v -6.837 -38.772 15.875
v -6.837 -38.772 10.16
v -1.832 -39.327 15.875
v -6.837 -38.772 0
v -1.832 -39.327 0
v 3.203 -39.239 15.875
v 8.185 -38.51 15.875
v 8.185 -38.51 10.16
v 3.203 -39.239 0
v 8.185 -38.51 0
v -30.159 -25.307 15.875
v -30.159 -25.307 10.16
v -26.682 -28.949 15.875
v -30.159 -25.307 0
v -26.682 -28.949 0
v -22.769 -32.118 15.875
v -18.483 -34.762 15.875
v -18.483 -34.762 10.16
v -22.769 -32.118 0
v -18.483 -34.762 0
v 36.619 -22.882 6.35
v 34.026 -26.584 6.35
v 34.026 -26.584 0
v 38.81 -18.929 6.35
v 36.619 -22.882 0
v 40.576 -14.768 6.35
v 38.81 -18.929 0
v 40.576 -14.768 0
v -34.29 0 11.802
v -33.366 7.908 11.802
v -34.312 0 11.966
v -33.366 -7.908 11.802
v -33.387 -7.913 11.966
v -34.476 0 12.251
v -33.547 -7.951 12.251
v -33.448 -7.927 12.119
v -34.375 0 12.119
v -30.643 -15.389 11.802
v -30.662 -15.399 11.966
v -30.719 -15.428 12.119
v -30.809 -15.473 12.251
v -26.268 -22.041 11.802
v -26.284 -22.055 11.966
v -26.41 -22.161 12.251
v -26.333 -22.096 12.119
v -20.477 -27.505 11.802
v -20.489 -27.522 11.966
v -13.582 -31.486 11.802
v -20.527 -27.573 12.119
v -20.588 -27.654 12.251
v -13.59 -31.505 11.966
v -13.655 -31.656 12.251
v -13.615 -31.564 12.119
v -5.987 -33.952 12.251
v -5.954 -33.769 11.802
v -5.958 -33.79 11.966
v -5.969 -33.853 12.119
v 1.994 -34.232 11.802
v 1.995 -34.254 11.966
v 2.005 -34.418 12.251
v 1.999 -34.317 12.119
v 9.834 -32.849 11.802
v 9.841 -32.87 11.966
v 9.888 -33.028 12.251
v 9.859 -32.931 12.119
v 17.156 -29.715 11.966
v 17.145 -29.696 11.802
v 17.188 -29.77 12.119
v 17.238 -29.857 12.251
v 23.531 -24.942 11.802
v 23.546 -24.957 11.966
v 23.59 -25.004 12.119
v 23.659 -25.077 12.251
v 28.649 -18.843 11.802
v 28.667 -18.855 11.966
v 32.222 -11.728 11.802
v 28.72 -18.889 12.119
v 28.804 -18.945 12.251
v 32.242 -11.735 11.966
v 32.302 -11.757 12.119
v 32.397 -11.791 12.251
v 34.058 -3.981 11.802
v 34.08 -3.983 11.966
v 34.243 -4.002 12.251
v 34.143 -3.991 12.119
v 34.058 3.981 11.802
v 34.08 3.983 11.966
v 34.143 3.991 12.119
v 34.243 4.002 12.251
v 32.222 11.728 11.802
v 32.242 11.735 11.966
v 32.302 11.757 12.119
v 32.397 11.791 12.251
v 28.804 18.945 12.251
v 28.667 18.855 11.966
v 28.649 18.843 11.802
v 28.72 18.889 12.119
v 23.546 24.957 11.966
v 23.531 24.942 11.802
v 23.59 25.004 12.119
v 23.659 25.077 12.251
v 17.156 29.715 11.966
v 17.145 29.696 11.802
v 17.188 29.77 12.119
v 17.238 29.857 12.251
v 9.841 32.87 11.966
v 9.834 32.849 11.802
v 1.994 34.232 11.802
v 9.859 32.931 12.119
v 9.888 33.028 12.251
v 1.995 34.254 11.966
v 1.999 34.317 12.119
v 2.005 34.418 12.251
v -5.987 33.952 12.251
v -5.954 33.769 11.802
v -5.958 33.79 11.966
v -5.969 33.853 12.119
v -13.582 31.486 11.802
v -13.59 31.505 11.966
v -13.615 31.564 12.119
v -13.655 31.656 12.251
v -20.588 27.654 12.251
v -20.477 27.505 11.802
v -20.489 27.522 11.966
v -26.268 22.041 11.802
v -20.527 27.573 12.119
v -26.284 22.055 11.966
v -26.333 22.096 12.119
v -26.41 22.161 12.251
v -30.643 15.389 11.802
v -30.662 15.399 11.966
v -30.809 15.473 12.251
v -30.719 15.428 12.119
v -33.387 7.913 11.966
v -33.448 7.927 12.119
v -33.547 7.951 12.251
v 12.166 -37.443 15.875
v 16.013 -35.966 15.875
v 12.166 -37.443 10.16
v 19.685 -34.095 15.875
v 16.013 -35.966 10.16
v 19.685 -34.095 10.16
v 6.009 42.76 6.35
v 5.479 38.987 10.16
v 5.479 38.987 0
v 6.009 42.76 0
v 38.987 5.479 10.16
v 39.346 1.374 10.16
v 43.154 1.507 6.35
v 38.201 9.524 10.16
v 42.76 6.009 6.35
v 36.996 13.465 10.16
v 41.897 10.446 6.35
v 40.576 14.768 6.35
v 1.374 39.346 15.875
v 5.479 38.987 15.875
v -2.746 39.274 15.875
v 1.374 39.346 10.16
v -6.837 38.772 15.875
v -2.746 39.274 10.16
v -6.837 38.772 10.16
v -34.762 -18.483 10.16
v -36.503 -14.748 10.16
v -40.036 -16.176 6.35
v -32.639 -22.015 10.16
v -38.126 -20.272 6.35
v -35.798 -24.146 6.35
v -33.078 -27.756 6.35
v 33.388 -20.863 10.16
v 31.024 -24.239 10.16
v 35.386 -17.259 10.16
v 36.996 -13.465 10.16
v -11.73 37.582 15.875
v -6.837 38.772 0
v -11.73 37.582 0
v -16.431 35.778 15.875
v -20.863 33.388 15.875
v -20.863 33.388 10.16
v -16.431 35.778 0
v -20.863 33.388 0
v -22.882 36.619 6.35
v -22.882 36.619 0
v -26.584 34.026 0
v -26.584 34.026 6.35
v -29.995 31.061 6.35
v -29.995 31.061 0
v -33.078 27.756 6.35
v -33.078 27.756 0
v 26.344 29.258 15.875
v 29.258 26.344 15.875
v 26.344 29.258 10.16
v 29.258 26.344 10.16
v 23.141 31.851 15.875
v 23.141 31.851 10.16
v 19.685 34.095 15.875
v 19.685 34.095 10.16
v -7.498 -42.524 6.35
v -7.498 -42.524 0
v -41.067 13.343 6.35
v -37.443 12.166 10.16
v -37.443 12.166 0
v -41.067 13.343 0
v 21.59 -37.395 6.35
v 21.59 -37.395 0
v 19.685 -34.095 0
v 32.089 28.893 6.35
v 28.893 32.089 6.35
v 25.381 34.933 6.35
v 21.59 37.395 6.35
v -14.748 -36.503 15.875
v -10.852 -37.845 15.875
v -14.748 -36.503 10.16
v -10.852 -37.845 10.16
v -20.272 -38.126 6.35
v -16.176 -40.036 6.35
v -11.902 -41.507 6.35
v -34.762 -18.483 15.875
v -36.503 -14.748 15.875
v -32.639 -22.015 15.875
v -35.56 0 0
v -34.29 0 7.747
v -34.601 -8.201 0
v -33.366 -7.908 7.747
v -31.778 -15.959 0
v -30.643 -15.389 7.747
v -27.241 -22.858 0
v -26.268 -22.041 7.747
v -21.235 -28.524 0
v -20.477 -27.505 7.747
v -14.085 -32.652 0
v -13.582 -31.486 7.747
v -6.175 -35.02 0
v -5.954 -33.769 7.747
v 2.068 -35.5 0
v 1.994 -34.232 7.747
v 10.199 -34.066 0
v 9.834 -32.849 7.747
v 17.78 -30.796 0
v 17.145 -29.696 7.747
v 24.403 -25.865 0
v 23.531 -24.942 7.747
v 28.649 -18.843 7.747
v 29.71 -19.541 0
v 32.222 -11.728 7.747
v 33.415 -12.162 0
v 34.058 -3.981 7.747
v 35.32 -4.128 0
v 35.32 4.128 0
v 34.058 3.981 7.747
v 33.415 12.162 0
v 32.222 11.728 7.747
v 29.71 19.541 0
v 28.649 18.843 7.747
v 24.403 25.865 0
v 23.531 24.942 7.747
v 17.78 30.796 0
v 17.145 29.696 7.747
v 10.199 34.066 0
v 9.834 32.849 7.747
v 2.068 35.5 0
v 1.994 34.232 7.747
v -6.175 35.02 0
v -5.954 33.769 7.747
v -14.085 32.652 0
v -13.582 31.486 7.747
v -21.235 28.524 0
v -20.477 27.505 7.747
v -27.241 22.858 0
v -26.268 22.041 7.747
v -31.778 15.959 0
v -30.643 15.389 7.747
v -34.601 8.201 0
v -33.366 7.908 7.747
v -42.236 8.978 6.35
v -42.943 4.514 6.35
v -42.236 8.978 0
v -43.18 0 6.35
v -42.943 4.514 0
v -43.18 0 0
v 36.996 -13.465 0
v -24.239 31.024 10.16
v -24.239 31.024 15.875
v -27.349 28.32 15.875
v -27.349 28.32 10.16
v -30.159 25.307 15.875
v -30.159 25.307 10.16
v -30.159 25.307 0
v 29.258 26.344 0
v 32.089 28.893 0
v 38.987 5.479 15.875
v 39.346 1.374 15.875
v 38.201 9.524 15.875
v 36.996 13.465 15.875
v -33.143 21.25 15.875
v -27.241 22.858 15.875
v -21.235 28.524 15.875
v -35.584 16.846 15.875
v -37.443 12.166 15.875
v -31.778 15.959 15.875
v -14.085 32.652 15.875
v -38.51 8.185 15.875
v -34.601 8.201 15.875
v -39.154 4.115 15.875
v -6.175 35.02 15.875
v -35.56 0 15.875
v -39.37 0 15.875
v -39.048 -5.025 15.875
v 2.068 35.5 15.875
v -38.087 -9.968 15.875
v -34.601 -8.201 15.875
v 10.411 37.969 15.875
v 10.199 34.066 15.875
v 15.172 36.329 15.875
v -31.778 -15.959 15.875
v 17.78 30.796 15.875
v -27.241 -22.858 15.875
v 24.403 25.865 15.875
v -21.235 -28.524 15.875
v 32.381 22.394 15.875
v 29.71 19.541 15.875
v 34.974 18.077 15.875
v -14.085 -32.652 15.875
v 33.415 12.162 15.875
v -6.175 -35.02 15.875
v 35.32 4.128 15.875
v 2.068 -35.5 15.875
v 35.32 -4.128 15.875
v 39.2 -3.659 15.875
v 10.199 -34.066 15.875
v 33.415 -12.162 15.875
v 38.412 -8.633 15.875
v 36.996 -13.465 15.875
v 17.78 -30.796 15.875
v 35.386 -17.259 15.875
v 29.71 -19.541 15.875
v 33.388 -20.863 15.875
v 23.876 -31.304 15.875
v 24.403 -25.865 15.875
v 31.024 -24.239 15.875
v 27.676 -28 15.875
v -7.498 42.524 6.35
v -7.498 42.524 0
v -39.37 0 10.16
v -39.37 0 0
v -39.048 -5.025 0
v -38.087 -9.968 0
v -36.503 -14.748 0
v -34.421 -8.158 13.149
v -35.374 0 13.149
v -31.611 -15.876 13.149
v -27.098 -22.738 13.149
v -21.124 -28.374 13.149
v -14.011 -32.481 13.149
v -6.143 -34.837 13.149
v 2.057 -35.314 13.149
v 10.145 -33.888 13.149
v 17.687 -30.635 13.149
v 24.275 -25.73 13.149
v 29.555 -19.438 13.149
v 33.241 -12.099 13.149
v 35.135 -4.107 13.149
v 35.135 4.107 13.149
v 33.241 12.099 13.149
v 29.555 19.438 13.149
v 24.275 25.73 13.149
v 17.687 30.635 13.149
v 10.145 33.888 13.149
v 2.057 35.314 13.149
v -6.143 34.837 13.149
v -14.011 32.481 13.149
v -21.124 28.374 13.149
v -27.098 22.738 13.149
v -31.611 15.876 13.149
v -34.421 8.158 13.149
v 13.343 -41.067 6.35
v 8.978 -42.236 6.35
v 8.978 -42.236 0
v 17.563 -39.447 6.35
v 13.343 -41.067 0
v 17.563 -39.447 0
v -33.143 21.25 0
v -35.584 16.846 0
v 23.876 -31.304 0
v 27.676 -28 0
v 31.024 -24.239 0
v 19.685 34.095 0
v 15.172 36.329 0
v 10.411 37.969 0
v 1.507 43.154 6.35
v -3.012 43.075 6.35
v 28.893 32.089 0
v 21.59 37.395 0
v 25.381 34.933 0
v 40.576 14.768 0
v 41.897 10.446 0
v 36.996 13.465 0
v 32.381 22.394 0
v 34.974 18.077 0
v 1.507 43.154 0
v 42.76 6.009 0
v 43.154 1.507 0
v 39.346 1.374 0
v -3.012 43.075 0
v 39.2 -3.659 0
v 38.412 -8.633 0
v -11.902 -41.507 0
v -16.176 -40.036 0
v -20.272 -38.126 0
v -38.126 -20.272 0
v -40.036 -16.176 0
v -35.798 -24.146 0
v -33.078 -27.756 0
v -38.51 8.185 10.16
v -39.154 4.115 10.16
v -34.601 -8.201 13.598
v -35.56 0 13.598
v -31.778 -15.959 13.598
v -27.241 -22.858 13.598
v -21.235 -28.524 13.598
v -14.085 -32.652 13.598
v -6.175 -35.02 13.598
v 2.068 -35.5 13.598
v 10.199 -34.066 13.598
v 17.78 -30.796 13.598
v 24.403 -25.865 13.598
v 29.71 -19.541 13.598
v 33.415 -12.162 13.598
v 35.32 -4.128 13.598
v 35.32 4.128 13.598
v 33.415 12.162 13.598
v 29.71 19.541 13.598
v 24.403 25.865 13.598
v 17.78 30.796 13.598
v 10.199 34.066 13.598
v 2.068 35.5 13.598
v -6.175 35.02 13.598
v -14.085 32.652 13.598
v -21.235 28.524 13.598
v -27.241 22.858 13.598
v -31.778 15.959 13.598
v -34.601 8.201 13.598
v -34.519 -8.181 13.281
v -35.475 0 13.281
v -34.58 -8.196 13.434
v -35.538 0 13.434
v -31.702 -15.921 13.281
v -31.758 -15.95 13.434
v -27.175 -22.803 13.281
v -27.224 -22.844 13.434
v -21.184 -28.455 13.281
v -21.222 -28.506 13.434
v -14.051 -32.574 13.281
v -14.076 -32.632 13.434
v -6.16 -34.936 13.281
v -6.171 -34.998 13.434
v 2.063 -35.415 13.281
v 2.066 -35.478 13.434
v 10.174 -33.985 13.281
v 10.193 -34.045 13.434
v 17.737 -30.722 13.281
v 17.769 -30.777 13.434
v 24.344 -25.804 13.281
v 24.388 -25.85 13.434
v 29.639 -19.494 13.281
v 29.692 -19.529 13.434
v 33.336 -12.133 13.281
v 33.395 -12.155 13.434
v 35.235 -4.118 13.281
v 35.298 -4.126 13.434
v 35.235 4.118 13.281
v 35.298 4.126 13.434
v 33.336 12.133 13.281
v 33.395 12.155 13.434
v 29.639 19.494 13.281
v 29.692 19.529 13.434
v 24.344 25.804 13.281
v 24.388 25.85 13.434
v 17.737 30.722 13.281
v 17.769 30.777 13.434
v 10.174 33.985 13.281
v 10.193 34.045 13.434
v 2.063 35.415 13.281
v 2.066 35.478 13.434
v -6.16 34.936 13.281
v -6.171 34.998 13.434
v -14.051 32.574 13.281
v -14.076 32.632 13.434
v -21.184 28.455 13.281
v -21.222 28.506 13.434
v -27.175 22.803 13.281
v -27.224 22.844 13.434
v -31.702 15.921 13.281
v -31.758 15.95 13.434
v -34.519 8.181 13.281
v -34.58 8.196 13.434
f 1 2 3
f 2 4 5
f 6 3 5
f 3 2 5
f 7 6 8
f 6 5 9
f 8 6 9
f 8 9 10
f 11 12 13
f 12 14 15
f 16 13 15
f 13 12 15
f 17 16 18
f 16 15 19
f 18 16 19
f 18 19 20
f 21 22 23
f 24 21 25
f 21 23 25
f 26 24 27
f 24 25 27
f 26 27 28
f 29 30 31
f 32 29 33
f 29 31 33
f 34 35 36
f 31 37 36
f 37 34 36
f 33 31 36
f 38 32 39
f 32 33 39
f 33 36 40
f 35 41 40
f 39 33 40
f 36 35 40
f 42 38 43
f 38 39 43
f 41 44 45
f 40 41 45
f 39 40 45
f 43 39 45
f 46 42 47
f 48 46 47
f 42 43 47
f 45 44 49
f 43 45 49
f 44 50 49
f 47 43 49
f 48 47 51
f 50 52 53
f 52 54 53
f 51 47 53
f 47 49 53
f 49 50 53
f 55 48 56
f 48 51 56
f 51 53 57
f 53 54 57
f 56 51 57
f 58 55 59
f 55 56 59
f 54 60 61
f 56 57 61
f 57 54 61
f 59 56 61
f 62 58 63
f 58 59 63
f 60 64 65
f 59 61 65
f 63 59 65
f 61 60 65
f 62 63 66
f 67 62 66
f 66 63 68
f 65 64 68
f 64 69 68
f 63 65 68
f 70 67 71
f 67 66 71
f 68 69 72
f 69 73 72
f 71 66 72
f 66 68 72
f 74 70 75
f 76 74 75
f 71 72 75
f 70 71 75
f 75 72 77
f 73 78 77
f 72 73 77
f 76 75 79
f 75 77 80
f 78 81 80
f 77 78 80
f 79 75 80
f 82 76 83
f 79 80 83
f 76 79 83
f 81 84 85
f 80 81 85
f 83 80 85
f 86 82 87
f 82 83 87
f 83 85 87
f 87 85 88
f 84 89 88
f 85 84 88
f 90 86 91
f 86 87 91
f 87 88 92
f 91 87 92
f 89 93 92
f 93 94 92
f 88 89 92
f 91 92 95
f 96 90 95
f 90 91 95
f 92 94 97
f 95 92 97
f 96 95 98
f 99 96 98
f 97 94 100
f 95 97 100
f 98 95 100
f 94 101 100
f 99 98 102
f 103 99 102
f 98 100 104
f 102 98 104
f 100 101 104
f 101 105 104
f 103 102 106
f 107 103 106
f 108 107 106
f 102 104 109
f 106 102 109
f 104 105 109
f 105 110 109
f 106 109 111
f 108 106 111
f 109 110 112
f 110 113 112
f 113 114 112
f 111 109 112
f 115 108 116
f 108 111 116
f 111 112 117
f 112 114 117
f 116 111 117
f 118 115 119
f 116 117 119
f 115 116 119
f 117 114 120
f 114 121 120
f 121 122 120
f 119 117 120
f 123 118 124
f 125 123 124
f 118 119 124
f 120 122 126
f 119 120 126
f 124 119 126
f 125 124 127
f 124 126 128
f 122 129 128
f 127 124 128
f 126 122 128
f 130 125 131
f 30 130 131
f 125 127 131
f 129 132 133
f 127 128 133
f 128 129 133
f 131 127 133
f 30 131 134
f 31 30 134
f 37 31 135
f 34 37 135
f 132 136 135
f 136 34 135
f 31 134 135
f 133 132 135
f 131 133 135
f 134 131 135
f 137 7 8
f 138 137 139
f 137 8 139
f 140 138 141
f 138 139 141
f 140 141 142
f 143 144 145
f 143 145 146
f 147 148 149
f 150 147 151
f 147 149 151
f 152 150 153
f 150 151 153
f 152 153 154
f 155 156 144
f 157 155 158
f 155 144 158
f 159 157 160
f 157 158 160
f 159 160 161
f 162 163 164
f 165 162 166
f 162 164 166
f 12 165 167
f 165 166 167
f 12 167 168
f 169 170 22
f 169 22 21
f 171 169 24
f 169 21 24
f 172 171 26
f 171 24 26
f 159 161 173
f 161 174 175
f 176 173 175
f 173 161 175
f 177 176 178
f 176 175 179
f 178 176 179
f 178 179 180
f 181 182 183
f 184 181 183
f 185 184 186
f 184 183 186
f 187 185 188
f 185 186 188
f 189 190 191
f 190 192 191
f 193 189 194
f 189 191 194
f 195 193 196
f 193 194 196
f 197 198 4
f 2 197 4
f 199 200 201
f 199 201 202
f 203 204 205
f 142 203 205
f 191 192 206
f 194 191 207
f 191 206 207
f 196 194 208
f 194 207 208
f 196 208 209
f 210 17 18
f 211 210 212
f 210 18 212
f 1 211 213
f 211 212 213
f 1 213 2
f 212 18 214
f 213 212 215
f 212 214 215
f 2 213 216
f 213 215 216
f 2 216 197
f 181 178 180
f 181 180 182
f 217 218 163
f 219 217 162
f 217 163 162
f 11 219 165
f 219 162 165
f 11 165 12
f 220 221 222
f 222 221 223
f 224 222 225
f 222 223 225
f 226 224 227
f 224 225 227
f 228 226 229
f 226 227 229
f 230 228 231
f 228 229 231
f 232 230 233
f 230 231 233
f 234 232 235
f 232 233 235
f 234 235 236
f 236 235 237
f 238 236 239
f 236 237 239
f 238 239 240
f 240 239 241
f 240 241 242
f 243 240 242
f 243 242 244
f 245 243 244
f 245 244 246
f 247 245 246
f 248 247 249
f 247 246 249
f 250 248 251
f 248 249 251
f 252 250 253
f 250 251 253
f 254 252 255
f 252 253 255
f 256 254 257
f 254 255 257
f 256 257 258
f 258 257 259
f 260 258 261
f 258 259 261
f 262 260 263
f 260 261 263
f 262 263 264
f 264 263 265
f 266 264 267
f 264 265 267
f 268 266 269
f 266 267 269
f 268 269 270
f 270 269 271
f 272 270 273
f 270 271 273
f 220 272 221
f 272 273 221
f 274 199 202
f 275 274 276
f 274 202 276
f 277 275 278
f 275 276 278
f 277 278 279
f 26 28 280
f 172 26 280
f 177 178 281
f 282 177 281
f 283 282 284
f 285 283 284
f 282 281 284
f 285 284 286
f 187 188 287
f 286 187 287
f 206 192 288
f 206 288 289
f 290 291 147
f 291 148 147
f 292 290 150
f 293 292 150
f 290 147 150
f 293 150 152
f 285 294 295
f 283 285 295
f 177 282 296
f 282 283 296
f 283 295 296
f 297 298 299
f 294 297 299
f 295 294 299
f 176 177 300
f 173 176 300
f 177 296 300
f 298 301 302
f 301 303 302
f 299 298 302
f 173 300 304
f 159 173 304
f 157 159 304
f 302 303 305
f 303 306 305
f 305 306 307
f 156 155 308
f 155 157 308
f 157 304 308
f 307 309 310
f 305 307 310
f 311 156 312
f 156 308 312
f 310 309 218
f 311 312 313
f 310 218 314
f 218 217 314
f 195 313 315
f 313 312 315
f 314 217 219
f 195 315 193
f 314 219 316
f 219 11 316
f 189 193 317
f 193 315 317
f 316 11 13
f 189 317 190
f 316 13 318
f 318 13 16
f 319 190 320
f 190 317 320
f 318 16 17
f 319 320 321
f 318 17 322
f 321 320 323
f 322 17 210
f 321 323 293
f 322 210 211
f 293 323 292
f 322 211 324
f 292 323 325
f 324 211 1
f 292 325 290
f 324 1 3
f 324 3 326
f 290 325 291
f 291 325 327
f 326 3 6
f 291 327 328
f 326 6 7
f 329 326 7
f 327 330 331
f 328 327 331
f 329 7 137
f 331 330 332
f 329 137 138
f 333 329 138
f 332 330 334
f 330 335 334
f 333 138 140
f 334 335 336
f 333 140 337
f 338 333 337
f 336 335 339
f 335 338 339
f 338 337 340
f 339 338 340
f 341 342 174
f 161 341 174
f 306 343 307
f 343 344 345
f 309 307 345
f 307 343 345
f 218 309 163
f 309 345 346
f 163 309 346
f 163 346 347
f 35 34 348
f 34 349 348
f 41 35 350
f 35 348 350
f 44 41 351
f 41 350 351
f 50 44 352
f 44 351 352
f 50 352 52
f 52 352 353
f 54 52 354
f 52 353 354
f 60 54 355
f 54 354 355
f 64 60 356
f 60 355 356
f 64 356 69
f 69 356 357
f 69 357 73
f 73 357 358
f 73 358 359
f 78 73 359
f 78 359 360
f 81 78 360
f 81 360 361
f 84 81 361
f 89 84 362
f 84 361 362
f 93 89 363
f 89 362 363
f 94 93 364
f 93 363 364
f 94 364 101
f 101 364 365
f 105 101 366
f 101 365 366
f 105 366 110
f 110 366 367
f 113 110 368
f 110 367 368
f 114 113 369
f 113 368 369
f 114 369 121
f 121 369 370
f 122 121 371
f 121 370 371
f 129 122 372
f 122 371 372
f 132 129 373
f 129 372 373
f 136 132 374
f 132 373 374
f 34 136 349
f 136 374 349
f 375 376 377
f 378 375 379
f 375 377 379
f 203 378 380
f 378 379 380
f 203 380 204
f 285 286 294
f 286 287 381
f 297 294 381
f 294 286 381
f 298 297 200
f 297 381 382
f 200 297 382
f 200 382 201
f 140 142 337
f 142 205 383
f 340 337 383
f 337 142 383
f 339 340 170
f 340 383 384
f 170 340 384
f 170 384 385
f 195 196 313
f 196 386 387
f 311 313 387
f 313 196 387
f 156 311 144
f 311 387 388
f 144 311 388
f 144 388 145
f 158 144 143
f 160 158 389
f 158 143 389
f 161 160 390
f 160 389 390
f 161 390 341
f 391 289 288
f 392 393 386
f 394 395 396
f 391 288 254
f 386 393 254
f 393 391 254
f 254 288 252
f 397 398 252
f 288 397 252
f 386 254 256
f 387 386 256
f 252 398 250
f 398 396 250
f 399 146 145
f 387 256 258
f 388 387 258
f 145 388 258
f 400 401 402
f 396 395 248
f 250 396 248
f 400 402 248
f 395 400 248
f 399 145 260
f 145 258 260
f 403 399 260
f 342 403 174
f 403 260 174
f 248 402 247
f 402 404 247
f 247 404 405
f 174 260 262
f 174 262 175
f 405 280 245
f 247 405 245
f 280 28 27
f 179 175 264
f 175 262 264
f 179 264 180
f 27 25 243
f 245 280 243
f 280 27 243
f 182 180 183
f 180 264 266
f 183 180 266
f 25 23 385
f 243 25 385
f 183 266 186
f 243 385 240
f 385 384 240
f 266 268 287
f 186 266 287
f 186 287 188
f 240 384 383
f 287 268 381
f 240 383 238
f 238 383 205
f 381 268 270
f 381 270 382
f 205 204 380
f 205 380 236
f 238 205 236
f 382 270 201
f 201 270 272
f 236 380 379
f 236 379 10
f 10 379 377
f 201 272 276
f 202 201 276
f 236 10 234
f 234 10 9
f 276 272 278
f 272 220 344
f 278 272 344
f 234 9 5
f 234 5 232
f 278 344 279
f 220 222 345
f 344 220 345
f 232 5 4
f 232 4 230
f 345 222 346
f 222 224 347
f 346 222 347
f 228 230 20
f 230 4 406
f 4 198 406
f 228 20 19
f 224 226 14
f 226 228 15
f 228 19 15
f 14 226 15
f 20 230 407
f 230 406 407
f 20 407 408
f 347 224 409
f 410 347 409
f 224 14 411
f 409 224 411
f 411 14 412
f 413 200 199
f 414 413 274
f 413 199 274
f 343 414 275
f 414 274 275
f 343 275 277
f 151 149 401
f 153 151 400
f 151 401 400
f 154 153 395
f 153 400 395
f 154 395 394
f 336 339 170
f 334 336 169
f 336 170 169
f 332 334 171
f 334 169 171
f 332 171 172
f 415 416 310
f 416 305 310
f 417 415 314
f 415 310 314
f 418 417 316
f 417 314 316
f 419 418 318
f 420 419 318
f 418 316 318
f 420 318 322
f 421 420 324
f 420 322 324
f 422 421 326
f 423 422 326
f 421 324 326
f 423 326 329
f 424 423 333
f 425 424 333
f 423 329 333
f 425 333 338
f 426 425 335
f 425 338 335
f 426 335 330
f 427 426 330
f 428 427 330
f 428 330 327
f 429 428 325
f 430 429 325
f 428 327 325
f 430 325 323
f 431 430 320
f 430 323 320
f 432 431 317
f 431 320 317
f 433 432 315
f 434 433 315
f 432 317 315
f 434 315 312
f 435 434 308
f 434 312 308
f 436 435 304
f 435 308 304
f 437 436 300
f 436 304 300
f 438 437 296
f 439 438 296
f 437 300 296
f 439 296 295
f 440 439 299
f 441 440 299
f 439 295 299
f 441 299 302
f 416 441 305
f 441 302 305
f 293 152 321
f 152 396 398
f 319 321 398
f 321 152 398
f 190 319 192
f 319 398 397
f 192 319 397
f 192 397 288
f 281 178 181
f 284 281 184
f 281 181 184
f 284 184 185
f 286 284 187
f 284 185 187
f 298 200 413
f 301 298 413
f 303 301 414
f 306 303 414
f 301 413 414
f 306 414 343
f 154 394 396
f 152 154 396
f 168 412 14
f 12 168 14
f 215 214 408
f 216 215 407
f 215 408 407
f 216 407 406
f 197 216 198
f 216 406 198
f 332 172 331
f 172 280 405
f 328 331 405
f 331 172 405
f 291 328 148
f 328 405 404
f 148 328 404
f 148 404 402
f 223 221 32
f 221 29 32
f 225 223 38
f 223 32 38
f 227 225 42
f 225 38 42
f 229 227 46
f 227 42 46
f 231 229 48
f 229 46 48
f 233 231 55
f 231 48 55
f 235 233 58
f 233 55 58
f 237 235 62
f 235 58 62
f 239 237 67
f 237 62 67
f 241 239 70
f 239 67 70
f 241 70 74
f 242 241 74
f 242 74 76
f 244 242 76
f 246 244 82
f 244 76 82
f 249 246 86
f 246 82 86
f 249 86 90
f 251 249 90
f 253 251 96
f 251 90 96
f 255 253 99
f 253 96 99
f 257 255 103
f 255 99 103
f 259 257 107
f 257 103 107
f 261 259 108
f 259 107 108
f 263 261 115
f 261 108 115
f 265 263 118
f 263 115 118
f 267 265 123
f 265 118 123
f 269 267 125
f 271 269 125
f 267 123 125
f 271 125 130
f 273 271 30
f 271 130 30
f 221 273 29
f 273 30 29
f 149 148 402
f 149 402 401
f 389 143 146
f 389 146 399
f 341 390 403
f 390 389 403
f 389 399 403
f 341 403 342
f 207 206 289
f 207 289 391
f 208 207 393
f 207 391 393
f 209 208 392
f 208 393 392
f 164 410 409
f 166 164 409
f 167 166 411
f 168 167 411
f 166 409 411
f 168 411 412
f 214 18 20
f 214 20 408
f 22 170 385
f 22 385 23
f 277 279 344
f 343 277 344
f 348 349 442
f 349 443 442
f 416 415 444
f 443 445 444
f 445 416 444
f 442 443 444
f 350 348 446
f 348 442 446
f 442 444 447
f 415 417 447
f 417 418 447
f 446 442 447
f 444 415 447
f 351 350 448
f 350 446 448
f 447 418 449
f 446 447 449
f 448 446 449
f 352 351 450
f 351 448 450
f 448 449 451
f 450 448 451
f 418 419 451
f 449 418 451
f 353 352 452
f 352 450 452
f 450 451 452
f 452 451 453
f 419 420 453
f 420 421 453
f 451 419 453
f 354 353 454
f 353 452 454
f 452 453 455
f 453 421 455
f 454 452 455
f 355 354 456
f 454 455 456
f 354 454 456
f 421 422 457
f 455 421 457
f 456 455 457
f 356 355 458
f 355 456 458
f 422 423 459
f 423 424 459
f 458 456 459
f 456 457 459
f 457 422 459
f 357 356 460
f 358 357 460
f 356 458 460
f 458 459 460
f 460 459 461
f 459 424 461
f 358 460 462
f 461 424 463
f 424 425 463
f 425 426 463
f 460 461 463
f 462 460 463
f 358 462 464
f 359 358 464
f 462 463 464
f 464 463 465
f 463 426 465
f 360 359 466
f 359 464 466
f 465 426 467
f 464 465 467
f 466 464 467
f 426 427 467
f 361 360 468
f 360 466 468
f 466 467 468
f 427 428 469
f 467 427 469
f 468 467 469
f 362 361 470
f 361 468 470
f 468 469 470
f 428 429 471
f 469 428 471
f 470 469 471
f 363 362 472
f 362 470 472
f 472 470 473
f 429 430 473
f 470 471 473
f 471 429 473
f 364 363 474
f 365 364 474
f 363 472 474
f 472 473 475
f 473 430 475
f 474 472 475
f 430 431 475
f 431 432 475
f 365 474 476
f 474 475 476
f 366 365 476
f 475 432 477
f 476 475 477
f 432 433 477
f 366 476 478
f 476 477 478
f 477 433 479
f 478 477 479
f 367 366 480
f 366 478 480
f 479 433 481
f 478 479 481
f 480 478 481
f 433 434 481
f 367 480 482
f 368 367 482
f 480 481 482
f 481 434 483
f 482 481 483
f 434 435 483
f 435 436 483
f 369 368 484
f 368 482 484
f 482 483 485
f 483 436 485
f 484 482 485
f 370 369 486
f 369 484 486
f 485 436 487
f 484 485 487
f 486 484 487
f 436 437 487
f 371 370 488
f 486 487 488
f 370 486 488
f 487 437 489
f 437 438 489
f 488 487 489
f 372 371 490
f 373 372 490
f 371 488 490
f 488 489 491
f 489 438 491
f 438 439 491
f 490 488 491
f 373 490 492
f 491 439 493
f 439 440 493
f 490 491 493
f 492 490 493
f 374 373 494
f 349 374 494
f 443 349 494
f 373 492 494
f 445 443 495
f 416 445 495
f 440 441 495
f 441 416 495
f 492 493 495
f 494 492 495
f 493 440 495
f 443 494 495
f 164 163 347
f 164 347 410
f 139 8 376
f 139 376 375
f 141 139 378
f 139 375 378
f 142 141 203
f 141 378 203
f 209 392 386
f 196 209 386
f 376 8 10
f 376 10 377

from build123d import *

# Parameters (mm, degrees)
F3_DEPTH        = 25.4
F3_COPIES_COUNT = 9


# Not quite as in the source:
# - a pattern or mirror of a feature is missing from the dataset's text; its kind, count and spacing are read off the source's solid


with BuildPart() as f1:
    # F0 (on Front) → F1 (revolve)
    with BuildSketch(Plane.XZ):
        with BuildLine():
            Line((-43.18, 15.875), (-43.18, 0))
            Line((-43.18, 0), (-35.56, 0))
            Line((-35.56, 0), (-34.29, 7.747))
            Line((-34.29, 7.747), (-34.29, 11.8019743879))
            ThreePointArc((-34.29, 11.8019743879), (-34.3383364969, 12.0449783674), (-34.4759871939, 12.2509871939))
            Line((-34.4759871939, 12.2509871939), (-35.3740128061, 13.1490128061))
            ThreePointArc((-35.3740128061, 13.1490128061), (-35.5116635031, 13.3550216326), (-35.56, 13.5980256121))
            Line((-35.56, 13.5980256121), (-35.56, 15.875))
            Line((-35.56, 15.875), (-43.18, 15.875))
        make_face()
    revolve(axis=Axis((0, 0, 20.137766609), (0, 0, 1)))

    # F2 (on face) → F3 (cut)
    with BuildSketch(Plane(origin=(0, 0, 0), x_dir=(1, 0, 0), z_dir=(0, 0, -1))):
        with BuildLine():
            Line((-49.9110633764, 0), (-39.37, 0))
            ThreePointArc((-39.37, 0), (-38.6466622123, 7.512150148), (-36.5032283543, 14.7482615828))
            Line((-36.5032283543, 14.7482615828), (-46.2767321268, 18.6970134252))
            ThreePointArc((-46.2767321268, 18.6970134252), (-48.994056565, 9.523479861), (-49.9110633764, 0))
        make_face()
    f3 = extrude(amount=-F3_DEPTH, mode=Mode.SUBTRACT)

    # F3_copies: F3 ×9 about axis
    f3_copies_axis = Axis((0, 0, 0), (0, 0, 1))
    for i in range(1, F3_COPIES_COUNT):
        add(f3.rotate(f3_copies_axis, i * 360 / F3_COPIES_COUNT), mode=Mode.SUBTRACT)

    # F5 (on Right) → F6 (revolve, cut)
    with BuildSketch(Plane.YZ):
        Polygon((39.37, 15.875), (39.37, 10.16), (43.18, 6.35), (43.18, 15.875), align=None)
    revolve(axis=Axis((0, 0, 20.137766609), (0, 0, 1)), mode=Mode.SUBTRACT)


solid = f1.part
